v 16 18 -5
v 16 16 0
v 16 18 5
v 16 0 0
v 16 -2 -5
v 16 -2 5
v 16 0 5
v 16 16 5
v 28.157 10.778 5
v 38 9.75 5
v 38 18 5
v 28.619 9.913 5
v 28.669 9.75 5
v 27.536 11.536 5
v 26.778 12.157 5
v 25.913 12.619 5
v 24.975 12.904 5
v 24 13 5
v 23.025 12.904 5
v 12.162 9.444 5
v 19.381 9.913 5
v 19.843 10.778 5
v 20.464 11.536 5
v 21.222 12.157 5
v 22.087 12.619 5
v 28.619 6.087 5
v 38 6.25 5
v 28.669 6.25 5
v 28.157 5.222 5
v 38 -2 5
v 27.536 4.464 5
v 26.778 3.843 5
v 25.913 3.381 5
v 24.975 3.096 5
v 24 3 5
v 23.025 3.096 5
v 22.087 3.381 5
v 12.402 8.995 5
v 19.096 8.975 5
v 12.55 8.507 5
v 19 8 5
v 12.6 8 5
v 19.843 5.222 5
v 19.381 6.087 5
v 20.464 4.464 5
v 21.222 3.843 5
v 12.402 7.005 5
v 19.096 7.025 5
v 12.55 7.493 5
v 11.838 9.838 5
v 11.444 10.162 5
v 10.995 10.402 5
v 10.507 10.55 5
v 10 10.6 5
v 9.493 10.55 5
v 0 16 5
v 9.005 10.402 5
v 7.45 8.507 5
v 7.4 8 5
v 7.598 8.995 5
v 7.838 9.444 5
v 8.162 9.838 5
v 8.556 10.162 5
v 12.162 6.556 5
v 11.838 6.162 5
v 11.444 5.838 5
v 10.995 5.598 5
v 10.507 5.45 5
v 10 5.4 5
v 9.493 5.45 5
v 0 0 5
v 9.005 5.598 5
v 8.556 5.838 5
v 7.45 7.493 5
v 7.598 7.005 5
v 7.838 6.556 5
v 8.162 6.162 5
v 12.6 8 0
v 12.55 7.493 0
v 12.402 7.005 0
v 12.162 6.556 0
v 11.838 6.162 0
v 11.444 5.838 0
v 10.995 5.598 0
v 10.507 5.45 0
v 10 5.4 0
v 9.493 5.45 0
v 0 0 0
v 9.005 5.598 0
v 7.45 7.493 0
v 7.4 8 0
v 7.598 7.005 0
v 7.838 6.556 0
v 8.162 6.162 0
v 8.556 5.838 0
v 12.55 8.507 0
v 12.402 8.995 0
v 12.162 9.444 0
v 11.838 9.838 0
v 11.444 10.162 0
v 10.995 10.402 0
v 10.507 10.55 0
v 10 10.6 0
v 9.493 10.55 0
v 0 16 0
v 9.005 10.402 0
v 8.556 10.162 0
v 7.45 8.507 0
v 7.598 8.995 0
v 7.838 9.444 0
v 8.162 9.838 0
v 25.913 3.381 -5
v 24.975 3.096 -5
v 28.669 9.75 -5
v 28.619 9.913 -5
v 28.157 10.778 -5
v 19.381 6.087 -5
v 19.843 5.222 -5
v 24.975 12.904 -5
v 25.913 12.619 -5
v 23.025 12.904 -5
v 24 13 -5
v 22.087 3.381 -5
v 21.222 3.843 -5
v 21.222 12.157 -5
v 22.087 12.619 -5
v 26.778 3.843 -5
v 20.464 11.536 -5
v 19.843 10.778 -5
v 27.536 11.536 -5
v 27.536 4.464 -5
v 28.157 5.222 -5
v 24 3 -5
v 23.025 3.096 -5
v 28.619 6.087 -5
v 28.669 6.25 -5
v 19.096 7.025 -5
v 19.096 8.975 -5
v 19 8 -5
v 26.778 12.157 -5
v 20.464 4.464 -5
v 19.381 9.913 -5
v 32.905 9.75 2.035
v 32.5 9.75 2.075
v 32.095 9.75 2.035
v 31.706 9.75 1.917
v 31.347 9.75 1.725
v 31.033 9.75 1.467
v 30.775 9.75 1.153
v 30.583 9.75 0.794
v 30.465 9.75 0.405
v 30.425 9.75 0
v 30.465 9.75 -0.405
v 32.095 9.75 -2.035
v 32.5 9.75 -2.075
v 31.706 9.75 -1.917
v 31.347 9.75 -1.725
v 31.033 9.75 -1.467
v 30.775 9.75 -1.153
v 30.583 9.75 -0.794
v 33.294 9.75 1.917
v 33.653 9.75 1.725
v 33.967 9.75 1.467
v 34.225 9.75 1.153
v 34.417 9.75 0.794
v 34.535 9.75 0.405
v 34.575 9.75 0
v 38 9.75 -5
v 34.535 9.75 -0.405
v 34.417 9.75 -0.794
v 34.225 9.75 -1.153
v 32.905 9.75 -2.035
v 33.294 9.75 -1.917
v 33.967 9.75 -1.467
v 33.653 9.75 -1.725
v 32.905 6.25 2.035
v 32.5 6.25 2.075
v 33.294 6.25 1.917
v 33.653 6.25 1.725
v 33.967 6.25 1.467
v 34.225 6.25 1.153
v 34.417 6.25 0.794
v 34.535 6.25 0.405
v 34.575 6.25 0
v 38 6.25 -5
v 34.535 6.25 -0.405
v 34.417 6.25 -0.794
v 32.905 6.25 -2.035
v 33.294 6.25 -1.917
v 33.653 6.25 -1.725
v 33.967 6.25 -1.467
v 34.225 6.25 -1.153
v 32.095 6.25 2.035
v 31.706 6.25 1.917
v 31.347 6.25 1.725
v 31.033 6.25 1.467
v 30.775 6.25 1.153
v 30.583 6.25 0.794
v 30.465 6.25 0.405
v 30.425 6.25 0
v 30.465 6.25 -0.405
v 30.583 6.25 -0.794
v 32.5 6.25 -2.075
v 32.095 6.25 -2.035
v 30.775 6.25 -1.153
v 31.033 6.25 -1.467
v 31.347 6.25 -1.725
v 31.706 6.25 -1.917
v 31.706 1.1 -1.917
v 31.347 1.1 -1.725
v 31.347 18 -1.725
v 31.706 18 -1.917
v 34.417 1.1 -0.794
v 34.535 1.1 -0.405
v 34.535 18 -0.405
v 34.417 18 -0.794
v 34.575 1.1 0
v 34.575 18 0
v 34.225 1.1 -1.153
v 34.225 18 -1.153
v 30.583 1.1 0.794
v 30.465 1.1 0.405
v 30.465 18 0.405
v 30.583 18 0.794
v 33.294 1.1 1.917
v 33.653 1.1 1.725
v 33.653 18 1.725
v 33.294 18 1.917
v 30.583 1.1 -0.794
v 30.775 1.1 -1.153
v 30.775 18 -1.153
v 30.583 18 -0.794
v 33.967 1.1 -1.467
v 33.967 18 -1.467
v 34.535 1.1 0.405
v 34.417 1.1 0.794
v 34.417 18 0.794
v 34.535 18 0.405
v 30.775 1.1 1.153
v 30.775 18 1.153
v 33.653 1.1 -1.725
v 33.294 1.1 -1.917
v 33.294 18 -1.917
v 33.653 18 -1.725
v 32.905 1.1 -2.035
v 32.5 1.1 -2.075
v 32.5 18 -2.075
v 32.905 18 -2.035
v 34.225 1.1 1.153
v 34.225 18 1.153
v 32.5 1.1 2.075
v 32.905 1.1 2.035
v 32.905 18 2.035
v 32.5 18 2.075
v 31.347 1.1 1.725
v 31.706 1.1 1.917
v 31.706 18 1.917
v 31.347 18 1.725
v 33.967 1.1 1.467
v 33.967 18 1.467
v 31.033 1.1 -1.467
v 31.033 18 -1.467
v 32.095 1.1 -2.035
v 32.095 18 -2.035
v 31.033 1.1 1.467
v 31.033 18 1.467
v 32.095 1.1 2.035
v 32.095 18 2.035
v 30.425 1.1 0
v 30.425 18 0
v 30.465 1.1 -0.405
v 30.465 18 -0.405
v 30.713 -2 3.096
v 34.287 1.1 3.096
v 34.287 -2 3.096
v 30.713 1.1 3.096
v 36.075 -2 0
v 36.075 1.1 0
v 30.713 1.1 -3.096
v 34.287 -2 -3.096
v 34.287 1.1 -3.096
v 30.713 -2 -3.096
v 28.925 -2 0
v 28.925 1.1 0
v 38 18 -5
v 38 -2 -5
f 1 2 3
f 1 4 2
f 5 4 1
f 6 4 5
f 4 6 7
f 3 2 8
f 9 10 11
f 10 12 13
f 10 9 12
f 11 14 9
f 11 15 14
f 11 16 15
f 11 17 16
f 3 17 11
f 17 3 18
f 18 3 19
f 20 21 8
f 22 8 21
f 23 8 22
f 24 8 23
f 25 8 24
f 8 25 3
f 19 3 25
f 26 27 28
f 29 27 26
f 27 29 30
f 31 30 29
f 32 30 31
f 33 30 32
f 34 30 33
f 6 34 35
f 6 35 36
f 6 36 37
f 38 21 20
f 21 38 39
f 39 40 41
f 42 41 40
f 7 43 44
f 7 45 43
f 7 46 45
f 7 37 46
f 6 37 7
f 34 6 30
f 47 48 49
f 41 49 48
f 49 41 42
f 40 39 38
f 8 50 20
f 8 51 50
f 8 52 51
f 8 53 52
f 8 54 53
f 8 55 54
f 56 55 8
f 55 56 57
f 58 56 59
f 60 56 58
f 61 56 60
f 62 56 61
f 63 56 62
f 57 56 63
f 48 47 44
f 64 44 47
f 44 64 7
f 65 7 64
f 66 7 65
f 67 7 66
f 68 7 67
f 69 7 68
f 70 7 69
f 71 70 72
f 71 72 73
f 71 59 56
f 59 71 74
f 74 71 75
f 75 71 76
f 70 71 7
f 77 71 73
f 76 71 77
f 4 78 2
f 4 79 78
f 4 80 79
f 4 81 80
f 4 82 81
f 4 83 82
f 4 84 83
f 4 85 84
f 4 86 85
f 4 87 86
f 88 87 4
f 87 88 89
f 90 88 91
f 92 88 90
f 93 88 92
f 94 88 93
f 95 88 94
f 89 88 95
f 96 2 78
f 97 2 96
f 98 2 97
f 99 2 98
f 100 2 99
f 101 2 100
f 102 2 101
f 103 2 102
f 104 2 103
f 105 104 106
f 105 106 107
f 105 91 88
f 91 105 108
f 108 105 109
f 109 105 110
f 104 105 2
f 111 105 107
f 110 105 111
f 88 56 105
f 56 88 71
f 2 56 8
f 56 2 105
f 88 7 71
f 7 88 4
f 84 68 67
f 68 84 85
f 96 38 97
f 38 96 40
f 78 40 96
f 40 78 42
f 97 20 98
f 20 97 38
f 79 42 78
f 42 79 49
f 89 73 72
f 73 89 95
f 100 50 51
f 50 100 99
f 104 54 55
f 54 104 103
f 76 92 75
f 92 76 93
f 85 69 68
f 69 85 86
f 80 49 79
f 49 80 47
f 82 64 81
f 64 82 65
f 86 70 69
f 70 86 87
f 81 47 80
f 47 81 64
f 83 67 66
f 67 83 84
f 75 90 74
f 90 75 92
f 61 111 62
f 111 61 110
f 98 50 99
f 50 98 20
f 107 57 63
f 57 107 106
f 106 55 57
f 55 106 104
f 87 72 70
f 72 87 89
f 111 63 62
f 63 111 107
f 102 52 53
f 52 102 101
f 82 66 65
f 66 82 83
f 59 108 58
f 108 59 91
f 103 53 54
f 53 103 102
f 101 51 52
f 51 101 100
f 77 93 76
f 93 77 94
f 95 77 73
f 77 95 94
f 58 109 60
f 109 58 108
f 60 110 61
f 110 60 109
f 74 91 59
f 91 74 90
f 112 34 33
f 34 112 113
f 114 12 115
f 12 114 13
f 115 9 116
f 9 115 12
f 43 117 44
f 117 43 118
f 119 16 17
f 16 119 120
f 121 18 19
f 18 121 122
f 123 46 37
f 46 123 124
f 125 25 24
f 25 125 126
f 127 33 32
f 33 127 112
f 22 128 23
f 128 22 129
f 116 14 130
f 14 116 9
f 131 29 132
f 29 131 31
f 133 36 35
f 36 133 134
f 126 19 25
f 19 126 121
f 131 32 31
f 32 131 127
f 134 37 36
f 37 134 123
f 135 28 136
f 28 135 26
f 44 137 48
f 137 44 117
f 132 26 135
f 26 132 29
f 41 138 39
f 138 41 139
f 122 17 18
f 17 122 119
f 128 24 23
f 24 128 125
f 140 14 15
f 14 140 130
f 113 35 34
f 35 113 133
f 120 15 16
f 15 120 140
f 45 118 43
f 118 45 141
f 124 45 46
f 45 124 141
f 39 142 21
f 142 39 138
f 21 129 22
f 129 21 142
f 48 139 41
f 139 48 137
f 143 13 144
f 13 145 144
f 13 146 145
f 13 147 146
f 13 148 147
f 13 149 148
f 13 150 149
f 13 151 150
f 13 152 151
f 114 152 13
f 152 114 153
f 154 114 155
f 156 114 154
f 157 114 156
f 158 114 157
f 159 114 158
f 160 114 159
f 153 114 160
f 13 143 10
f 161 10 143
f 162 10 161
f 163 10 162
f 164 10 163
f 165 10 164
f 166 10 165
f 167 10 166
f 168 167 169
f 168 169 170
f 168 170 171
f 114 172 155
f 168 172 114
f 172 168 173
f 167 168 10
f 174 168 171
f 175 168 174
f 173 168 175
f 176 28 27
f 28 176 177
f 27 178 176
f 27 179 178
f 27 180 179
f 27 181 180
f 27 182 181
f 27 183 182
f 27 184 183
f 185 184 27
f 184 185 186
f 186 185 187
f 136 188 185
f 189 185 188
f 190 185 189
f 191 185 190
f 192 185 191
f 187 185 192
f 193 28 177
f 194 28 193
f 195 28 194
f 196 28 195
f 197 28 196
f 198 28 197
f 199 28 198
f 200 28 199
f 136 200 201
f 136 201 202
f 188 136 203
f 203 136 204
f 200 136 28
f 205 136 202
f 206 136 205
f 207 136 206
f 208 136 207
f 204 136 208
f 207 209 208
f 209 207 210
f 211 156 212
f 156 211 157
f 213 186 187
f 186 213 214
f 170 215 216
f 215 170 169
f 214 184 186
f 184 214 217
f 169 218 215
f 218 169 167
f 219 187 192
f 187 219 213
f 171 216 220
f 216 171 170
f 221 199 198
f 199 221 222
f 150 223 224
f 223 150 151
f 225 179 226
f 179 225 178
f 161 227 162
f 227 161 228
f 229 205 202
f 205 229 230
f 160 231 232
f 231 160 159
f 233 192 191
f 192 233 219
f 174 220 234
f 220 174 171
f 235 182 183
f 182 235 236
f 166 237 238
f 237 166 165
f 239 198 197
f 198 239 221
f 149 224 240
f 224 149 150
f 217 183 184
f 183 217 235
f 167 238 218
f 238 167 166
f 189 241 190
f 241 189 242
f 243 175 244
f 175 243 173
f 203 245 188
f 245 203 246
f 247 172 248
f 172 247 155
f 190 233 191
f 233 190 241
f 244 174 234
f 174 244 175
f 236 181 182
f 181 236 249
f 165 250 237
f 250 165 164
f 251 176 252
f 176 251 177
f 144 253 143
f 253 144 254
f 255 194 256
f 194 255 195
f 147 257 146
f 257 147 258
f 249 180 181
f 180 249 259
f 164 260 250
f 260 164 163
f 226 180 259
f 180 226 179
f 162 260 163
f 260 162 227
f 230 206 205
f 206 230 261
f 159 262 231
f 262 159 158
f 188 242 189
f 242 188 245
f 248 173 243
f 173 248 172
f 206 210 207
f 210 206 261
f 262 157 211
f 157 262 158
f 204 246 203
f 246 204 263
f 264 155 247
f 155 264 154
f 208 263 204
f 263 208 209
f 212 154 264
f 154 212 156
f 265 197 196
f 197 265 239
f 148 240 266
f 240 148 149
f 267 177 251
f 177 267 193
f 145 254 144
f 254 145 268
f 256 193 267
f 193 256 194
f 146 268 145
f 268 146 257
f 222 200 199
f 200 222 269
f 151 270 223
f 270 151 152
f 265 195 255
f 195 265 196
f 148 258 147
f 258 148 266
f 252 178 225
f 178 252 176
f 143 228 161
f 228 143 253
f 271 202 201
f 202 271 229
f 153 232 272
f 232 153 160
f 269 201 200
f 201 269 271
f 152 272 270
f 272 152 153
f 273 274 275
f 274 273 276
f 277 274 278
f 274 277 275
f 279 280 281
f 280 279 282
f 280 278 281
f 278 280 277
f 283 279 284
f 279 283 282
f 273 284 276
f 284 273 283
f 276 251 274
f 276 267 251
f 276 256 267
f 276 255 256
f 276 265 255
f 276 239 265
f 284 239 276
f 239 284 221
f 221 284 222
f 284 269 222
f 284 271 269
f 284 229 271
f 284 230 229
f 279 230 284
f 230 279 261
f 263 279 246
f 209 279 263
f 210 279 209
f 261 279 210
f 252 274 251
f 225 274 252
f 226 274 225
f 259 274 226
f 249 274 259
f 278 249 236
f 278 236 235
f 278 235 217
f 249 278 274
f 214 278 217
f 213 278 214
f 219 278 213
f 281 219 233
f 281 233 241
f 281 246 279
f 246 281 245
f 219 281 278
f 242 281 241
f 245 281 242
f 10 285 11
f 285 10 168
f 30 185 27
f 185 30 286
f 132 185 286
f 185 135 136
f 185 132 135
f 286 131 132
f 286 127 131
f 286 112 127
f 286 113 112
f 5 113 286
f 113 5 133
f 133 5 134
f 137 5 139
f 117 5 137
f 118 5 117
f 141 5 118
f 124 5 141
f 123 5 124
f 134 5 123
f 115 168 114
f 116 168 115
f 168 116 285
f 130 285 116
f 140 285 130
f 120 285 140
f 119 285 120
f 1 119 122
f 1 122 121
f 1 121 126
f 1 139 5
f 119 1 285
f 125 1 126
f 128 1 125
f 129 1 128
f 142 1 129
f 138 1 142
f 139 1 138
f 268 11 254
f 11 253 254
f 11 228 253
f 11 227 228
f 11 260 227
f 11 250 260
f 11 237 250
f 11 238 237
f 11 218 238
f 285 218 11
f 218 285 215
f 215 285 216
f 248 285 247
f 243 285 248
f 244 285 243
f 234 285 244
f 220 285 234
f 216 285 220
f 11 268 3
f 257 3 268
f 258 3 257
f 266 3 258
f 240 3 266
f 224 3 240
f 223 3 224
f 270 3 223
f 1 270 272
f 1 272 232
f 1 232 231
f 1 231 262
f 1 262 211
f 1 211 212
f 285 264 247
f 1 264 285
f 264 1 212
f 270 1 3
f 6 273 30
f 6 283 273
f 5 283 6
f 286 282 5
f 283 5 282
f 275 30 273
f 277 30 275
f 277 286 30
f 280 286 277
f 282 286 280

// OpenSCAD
anchorWidth = 16;
anchorLength = 16;
anchorScrewDiameter = 5.2;
anchorThickness = 5;
screwOffset = 10;

$fn=32;

module anchorPlate() {
  difference() {
    cube([anchorLength, anchorWidth, anchorThickness]);
    translate([screwOffset, anchorWidth/2, -0.1]) cylinder(r=anchorScrewDiameter/2, h=anchorThickness+0.2);
  };
};

module hexNutM3(tolerance=0.15) {
 e = 6.01+tolerance;
 m = 2.3;
 cylinder(r=e/2, h=m, $fn=6);
}

module hexNutM4(tolerance=0.15) {
 e = 7+tolerance;
 m = 3.2;
 cylinder(r=e/2, h=m, $fn=6);
}


mountWidth = 20;
mountLength = 22;
mountHeight = 10;
mountMinThickness = 3;
flexCutoutDiameter = mountWidth-4-2*mountMinThickness;
bladeOffset = 8.6;

tensionGap = 3.5;
tensionerScrew = 4.15;

module bladeBlock() {
  tensionScrewOffset = (mountLength - (mountMinThickness + flexCutoutDiameter)) / 2 + (mountMinThickness + flexCutoutDiameter)-1;

  difference() {
    cube([mountLength, mountWidth, mountHeight]);

    translate([-2, 0]) {
       // Flex cutout (round)
      translate([mountWidth/2, mountWidth/2, -0.1]) cylinder(r=flexCutoutDiameter/2, h=mountHeight+0.2);

      // Tension gap
      translate([flexCutoutDiameter, mountWidth/2-0.5*tensionGap, -0.1]) cube([mountLength, tensionGap, mountHeight+0.2]);
    }

    // Tension screw
    translate([tensionScrewOffset, -0.1, 0.5*mountHeight]) rotate([270, 0, 0]) union() {
      cylinder(r=tensionerScrew/2, h=mountWidth+0.2);
      hexNutM4();
    }

  }
}

module bladeMount() {
  anchorPlate();
  translate([anchorLength, -(mountWidth-anchorWidth)/2, anchorThickness-mountHeight]) bladeBlock();
}

bladeMount();
